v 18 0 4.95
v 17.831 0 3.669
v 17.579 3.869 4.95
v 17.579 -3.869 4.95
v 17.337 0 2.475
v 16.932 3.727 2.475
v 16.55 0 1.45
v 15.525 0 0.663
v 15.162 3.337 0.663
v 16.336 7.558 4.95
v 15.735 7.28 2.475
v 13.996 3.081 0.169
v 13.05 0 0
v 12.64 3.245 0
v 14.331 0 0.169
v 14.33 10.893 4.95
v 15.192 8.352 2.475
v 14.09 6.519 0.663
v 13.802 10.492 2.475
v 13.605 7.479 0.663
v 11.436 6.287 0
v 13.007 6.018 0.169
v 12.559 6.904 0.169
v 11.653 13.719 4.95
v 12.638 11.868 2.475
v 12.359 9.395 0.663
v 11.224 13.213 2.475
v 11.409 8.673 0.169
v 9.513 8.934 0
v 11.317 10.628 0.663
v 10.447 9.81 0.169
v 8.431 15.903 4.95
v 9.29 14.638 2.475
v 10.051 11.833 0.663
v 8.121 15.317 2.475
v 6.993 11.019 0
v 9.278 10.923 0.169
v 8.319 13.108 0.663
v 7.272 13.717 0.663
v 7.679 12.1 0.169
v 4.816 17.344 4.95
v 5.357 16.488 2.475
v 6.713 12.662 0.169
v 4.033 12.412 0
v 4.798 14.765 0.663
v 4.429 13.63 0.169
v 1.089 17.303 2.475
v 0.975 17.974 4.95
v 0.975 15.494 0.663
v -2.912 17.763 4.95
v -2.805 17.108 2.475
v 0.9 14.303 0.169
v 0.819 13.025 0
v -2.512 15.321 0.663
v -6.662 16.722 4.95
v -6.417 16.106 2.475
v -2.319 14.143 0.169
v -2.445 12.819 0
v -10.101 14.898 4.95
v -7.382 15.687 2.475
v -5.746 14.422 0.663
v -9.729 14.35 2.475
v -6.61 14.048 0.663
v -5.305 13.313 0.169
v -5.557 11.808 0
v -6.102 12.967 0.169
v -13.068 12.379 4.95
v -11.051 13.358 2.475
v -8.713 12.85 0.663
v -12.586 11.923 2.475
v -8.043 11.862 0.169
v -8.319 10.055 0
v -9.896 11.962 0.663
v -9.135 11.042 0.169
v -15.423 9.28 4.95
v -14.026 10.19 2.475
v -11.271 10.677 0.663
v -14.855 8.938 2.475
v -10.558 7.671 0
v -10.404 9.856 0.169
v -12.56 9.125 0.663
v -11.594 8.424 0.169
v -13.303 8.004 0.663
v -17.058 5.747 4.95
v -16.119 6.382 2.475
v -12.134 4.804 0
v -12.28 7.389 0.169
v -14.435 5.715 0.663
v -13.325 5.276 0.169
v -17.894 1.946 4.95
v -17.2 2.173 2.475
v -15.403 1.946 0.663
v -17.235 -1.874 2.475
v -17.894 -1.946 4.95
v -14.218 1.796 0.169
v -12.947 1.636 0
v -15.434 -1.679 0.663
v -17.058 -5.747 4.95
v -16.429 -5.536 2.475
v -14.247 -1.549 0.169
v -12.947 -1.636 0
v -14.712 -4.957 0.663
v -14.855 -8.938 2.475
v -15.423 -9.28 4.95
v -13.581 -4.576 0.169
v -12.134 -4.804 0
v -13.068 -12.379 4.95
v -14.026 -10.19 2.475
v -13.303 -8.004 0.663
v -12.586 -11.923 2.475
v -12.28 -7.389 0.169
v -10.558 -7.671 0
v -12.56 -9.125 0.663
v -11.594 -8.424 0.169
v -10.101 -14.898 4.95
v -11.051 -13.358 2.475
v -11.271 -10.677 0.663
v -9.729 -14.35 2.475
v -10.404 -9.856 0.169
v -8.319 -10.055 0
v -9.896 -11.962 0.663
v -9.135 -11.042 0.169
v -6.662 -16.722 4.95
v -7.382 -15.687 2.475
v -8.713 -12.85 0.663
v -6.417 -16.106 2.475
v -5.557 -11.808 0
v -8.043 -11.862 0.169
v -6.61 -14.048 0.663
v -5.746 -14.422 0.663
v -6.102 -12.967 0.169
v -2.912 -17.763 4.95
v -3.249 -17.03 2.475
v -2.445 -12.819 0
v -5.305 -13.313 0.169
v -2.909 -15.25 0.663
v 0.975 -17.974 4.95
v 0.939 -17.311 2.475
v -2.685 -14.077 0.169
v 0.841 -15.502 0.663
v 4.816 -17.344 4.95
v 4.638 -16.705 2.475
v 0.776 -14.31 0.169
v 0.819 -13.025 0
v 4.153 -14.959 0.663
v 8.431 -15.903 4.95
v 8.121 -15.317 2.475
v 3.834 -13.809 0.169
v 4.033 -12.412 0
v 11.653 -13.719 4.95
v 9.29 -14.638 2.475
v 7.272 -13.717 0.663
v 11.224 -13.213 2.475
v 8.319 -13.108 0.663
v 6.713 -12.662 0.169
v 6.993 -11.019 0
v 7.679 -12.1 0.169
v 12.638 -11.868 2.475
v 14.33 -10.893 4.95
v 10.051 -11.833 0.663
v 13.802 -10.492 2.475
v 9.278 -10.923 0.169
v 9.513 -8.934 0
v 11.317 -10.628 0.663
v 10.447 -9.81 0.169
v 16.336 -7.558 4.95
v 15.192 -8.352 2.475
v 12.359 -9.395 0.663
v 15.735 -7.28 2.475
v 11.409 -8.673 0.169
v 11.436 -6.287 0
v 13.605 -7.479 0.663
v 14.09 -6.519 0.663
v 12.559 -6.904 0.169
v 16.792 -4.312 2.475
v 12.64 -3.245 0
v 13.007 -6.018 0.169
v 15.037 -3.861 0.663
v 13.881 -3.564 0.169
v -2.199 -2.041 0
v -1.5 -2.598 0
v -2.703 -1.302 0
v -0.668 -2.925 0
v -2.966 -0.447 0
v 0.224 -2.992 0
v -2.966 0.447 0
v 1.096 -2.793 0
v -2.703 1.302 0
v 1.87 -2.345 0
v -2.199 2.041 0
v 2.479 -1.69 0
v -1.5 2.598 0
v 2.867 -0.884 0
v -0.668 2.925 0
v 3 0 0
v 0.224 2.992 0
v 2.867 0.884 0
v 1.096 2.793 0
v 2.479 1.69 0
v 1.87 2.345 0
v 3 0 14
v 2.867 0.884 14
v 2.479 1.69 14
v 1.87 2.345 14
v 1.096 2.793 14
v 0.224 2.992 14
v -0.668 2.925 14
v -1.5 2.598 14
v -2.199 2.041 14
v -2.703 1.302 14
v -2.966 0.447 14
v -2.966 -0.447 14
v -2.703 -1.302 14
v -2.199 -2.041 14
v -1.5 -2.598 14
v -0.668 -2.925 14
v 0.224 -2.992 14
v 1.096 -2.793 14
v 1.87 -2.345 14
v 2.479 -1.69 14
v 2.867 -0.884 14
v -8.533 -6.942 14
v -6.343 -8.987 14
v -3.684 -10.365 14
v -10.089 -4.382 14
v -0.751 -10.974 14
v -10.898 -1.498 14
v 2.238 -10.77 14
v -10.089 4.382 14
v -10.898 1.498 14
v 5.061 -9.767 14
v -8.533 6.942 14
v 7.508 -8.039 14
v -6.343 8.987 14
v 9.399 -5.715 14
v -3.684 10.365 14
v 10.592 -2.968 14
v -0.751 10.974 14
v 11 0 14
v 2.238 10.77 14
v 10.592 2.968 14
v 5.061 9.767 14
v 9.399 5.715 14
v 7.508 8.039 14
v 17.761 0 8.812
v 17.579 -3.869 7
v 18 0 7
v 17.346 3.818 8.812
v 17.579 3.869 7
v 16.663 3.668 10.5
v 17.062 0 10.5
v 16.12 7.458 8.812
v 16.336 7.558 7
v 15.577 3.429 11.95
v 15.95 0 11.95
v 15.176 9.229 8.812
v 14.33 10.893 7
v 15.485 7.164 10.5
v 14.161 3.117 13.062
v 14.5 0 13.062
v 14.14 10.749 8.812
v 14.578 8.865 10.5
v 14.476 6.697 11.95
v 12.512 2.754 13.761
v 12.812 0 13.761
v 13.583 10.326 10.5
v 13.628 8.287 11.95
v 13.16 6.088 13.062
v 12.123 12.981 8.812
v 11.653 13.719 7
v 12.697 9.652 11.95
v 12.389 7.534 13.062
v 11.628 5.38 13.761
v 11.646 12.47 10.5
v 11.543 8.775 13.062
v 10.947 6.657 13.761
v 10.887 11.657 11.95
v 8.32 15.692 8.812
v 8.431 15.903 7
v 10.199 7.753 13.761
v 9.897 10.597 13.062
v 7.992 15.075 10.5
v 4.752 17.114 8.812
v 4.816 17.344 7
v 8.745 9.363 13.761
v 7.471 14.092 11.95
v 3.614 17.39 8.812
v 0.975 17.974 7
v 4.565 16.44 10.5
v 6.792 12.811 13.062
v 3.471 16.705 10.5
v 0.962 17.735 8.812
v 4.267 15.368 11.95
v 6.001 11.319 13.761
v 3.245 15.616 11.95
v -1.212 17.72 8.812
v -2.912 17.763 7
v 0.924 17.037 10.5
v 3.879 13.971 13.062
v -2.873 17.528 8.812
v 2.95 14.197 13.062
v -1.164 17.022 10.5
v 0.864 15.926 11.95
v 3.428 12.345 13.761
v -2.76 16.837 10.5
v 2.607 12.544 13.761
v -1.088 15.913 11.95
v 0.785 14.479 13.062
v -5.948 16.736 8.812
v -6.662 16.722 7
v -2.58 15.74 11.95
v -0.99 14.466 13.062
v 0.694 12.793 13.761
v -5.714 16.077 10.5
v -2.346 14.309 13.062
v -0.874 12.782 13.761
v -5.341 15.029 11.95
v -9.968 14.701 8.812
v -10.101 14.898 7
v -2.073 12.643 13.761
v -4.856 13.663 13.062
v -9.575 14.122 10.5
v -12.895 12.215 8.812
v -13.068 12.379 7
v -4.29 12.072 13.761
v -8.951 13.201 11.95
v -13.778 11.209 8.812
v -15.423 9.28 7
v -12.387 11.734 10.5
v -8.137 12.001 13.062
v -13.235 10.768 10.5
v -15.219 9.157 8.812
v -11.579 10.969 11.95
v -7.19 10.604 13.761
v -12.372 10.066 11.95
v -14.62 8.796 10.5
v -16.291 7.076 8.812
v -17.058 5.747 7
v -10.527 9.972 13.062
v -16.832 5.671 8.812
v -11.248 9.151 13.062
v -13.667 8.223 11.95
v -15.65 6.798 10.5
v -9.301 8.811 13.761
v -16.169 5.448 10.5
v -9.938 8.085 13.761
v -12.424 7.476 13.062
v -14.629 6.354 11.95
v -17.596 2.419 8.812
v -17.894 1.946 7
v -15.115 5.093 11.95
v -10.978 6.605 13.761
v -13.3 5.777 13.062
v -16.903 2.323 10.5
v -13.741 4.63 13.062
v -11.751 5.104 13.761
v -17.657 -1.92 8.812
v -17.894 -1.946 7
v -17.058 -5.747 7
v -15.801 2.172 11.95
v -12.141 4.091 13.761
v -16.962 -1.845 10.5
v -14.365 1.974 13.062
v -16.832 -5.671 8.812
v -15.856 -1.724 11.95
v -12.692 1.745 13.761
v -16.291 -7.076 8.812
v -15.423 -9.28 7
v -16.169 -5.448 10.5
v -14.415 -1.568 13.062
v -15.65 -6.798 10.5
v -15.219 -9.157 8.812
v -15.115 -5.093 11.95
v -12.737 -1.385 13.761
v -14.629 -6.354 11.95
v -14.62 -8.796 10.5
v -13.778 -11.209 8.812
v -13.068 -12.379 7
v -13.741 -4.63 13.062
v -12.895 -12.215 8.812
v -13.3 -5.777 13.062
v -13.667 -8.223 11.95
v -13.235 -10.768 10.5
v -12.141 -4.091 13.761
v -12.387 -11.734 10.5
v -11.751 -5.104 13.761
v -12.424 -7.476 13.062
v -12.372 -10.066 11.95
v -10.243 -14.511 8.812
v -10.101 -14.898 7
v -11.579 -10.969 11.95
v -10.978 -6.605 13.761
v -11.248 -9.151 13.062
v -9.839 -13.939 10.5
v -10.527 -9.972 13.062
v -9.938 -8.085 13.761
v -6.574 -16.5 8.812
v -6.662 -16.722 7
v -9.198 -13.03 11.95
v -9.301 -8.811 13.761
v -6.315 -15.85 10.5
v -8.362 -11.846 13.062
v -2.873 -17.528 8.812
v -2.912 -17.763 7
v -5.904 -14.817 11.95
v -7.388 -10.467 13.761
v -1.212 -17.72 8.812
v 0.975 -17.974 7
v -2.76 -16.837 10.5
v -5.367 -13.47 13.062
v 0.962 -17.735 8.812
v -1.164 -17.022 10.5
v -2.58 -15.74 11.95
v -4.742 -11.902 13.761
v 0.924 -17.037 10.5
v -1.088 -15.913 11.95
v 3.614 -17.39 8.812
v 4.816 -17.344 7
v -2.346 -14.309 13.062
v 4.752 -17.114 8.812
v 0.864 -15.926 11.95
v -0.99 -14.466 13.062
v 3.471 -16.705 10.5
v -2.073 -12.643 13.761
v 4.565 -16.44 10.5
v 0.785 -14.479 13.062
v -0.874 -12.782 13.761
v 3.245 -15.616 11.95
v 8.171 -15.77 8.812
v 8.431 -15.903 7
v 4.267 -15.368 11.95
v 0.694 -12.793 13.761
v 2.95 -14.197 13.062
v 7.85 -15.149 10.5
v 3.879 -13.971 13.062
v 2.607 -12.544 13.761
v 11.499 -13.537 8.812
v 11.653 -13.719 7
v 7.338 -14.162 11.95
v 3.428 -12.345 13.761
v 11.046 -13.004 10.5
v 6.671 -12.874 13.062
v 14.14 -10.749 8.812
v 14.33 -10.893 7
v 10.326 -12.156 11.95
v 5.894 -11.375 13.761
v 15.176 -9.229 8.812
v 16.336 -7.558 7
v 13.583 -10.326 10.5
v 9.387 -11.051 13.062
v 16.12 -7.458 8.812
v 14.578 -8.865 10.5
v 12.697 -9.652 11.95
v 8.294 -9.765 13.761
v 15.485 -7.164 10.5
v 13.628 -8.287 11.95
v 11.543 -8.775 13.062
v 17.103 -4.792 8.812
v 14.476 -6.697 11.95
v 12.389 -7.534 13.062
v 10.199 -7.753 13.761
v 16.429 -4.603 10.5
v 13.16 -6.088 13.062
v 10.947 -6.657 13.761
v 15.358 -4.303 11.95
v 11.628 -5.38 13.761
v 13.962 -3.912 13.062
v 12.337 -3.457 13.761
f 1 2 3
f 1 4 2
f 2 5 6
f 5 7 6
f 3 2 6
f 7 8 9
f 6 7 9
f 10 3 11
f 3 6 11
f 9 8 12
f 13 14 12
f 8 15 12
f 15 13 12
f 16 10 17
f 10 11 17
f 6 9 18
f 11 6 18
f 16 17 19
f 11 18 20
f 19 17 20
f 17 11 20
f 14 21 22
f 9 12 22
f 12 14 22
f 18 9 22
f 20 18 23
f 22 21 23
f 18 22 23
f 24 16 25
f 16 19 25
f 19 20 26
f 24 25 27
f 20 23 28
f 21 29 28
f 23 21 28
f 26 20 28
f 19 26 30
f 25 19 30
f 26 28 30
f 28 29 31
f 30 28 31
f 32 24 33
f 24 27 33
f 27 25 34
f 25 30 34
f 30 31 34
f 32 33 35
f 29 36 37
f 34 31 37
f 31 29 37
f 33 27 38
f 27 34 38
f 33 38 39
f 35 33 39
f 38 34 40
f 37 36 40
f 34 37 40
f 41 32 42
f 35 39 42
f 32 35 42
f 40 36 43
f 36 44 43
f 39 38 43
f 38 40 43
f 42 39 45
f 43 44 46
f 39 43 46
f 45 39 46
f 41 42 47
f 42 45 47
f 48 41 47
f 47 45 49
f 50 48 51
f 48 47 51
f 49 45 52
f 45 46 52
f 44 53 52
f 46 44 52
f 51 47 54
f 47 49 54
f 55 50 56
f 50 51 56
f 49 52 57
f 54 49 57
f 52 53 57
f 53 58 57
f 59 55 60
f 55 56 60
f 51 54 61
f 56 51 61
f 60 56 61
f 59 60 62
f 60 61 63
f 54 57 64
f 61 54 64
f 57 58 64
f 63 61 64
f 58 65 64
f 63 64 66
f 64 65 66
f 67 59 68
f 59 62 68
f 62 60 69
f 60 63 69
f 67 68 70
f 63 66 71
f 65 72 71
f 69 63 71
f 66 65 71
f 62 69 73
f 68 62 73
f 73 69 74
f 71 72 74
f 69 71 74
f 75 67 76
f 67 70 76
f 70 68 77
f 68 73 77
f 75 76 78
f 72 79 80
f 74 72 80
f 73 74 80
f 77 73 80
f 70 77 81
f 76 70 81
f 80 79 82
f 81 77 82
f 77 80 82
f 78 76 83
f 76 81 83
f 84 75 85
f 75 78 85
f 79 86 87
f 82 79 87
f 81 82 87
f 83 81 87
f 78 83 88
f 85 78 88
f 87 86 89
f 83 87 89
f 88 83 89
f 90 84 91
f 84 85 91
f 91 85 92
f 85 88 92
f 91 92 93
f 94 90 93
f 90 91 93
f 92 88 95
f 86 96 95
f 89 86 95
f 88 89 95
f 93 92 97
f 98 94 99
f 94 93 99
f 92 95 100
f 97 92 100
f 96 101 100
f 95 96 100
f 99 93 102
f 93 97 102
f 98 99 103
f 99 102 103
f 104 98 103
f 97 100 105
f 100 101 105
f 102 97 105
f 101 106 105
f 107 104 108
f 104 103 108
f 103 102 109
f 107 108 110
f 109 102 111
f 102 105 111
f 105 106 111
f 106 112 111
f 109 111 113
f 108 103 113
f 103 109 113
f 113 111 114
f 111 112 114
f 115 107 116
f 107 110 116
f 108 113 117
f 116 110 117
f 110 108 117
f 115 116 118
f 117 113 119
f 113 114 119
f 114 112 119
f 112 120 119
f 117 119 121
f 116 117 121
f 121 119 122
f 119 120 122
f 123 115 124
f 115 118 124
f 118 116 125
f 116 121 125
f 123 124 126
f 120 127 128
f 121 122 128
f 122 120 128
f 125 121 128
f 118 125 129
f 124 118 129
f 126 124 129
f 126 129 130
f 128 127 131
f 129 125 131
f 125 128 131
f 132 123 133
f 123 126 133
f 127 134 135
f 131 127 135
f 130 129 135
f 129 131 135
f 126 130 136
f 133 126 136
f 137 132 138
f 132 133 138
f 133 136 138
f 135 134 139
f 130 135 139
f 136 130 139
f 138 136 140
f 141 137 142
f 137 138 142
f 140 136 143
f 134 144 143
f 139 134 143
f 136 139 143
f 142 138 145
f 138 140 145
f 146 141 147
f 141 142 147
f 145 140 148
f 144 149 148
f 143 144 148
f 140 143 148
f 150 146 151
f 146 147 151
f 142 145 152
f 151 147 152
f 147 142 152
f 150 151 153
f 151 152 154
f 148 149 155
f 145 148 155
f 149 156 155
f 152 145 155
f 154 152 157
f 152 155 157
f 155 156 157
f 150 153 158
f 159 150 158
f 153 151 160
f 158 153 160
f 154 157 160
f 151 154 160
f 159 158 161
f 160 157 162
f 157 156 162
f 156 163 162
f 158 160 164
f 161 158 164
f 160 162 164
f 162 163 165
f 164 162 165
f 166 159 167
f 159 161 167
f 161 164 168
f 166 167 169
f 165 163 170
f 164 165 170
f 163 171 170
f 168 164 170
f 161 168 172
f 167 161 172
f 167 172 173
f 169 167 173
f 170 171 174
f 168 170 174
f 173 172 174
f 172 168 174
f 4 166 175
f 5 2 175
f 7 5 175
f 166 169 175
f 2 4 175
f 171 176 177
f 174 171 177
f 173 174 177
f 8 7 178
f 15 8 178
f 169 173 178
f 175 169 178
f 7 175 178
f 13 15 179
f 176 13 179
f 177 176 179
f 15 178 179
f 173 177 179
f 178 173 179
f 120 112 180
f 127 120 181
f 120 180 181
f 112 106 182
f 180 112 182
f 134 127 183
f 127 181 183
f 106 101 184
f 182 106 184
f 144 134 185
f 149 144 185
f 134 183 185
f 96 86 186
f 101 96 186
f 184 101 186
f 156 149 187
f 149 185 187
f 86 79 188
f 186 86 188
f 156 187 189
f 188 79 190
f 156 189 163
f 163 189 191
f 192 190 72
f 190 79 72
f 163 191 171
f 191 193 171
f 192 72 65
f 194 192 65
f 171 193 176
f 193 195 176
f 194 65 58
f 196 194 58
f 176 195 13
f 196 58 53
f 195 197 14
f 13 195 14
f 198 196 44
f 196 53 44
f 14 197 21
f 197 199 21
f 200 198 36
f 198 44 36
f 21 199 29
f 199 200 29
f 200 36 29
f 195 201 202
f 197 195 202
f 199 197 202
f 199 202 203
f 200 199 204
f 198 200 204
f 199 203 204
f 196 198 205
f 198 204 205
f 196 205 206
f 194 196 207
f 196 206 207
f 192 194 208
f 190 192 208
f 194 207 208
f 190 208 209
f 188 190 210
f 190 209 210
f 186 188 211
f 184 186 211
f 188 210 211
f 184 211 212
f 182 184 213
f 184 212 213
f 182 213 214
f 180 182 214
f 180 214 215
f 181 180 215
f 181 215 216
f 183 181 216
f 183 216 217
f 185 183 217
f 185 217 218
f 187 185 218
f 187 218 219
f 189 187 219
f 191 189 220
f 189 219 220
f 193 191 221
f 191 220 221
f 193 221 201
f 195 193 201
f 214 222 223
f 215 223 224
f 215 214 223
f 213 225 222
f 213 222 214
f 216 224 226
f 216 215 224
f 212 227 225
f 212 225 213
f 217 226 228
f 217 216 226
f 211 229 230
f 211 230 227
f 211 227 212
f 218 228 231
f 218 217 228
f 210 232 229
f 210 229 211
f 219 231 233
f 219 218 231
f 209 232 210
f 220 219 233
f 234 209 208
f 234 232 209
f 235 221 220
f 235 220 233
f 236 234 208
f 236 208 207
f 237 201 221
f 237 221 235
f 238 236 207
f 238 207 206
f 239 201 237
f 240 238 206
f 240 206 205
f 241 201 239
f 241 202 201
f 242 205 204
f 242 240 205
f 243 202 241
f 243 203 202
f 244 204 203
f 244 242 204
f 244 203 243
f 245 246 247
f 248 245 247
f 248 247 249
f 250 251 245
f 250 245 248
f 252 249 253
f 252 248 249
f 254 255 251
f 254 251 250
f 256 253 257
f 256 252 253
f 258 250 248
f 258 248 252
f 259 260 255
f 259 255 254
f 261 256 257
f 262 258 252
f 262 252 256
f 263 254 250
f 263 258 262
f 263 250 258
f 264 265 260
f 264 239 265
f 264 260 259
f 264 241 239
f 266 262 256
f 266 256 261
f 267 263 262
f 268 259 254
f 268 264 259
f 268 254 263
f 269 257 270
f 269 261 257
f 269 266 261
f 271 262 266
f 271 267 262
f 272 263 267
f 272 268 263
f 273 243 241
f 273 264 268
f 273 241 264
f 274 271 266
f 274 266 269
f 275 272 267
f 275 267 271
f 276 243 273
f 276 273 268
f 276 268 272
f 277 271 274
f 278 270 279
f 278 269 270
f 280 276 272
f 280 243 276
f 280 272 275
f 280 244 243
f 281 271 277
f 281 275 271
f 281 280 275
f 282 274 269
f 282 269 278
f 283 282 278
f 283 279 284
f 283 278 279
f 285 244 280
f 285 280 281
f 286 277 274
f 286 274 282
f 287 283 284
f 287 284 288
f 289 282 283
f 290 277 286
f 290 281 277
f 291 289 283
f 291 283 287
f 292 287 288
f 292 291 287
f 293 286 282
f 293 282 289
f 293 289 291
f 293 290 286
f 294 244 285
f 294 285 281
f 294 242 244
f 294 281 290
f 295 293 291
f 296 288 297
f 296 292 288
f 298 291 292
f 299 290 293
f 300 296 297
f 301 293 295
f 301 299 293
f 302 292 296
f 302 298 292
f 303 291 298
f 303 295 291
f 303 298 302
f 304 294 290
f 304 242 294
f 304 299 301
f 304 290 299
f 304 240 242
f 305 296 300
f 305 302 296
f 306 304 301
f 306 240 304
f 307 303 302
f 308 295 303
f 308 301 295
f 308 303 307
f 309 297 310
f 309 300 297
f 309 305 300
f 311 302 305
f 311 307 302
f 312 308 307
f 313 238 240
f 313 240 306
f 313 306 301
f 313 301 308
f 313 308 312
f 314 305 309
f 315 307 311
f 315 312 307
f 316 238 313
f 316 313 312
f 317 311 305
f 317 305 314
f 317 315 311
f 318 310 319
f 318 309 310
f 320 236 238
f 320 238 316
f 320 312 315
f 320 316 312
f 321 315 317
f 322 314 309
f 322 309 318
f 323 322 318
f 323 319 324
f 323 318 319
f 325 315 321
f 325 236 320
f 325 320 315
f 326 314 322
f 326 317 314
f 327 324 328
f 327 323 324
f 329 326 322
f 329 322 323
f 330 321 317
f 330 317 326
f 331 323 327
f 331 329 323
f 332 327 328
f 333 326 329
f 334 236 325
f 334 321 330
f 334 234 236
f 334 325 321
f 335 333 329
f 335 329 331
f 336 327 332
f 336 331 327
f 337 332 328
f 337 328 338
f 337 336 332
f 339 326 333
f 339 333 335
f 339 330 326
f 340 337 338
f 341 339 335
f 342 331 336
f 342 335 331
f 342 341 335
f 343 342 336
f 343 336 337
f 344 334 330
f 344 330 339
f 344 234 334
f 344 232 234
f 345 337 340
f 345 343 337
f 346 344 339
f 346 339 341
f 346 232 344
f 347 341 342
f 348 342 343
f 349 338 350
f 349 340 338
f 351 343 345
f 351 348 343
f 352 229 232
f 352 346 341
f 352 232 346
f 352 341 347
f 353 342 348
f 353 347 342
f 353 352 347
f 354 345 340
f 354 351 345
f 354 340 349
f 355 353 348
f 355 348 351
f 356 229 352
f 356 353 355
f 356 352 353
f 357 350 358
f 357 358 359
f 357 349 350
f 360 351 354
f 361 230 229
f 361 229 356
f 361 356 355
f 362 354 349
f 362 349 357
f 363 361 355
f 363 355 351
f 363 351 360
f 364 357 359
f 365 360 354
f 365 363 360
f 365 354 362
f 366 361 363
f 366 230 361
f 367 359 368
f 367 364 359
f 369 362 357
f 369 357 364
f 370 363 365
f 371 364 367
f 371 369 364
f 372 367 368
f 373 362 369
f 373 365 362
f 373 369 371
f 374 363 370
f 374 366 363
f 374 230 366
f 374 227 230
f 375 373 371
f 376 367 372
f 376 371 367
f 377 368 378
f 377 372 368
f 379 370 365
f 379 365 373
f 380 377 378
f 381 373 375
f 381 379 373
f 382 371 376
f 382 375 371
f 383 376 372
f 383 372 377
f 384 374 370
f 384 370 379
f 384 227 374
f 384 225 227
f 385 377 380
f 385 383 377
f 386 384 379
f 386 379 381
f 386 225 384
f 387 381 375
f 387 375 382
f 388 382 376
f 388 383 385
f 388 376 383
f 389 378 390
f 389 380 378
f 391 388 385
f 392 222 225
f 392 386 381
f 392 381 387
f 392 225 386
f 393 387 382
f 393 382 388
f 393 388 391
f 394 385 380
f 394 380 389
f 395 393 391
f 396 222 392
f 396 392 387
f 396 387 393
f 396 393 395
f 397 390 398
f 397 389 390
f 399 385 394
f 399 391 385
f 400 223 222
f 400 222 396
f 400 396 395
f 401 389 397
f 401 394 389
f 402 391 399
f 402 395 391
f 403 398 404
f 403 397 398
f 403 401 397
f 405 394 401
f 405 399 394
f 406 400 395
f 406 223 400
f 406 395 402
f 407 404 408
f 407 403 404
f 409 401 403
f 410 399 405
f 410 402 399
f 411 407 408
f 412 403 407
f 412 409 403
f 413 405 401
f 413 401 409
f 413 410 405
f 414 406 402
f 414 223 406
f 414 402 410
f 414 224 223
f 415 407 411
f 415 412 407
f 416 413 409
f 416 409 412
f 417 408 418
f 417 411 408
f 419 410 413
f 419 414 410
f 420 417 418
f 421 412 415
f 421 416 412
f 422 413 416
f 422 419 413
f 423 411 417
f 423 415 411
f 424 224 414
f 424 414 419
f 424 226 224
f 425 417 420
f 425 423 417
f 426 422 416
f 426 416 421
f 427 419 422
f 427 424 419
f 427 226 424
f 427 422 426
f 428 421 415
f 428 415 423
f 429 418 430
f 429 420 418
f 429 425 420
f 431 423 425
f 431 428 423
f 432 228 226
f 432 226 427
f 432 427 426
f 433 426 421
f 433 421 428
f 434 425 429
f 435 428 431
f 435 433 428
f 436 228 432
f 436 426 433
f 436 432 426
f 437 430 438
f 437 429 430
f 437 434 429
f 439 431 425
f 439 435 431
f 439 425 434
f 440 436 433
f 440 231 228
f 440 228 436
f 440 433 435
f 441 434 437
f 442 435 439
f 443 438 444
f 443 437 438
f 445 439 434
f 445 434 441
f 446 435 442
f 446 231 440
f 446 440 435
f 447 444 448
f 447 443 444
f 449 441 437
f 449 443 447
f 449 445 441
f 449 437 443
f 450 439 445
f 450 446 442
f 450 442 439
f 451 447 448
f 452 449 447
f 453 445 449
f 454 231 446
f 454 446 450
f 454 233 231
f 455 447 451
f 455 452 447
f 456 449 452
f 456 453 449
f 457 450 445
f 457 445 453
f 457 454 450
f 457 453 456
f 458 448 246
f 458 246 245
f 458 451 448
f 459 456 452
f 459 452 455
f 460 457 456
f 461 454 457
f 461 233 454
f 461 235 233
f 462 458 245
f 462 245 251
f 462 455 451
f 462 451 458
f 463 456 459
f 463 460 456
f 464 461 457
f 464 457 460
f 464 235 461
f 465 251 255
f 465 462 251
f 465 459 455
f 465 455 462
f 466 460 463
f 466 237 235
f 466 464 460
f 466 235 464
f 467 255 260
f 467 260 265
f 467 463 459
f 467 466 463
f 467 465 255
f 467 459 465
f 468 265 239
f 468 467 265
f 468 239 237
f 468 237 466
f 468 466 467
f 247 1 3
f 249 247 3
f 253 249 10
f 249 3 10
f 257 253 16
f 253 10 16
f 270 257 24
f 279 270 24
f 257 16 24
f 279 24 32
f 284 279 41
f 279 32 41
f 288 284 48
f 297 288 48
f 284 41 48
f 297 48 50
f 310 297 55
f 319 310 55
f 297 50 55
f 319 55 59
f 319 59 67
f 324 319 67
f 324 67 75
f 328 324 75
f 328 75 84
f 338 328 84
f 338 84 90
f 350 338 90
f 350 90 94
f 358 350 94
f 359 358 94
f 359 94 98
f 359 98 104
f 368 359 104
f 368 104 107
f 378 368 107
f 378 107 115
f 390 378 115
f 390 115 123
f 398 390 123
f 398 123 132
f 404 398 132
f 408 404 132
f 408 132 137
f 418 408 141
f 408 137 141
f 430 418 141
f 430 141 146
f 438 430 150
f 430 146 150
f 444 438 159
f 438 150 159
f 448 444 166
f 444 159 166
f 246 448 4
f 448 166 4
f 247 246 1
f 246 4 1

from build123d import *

# Parameters (mm, degrees)
ESBO_O1_R                = 18
RESSALTO_EXTRUS_O2_DEPTH = 14
FILETE6_R                = 7
ESBO_O3_R                = 3
CORTE_EXTRUS_O1_DEPTH    = 14


with BuildPart() as part:
    # Esboço1 → Ressalto-extrusão2 (new body)
    with BuildSketch(Plane.XY):
        Circle(ESBO_O1_R)
    extrude(amount=RESSALTO_EXTRUS_O2_DEPTH)

    # Filete6
    filete6_edges = [part.edges().sort_by_distance(p)[0] for p in [
        (-18, 0, 14),
    ]]
    fillet(filete6_edges, radius=FILETE6_R)

    # Filete7: read off the stored shape, not the designer's step
    # Filete7 outline → Filete7 (revolve, cut)
    with BuildSketch(Plane.XZ):
        with BuildLine():
            ThreePointArc((18, 4.949747468), (16.550252532, 1.449747468), (13.050252532, 0))
            Line((13.050252532, 0), (18, 0))
            Line((18, 0), (18, 4.949747468))
        make_face()
    revolve(axis=Axis((0, 0, 0), (0, 0, 1)), mode=Mode.SUBTRACT)

    # Esboço3 → Corte-extrusão1 (cut)
    with BuildSketch(Plane.XY.offset(14)):
        Circle(ESBO_O3_R)
    extrude(amount=-CORTE_EXTRUS_O1_DEPTH, mode=Mode.SUBTRACT)


solid = part.part
